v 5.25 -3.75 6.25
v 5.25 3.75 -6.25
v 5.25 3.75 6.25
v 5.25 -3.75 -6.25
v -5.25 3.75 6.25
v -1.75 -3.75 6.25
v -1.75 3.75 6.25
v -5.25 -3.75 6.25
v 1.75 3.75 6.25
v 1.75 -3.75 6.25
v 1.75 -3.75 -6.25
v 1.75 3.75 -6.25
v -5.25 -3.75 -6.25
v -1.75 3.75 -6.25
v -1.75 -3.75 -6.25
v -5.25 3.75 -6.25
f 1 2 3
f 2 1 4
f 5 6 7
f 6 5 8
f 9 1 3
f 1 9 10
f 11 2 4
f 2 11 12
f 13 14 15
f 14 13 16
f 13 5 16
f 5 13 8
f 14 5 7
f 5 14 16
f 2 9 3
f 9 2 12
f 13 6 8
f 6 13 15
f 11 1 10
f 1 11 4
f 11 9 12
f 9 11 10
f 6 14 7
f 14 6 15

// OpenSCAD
scale([0.500000, 0.500000, 0.500000]) 
difference() {
    cube([21, 15, 25], true);
    #cube([7, 15, 25], true);            
}
